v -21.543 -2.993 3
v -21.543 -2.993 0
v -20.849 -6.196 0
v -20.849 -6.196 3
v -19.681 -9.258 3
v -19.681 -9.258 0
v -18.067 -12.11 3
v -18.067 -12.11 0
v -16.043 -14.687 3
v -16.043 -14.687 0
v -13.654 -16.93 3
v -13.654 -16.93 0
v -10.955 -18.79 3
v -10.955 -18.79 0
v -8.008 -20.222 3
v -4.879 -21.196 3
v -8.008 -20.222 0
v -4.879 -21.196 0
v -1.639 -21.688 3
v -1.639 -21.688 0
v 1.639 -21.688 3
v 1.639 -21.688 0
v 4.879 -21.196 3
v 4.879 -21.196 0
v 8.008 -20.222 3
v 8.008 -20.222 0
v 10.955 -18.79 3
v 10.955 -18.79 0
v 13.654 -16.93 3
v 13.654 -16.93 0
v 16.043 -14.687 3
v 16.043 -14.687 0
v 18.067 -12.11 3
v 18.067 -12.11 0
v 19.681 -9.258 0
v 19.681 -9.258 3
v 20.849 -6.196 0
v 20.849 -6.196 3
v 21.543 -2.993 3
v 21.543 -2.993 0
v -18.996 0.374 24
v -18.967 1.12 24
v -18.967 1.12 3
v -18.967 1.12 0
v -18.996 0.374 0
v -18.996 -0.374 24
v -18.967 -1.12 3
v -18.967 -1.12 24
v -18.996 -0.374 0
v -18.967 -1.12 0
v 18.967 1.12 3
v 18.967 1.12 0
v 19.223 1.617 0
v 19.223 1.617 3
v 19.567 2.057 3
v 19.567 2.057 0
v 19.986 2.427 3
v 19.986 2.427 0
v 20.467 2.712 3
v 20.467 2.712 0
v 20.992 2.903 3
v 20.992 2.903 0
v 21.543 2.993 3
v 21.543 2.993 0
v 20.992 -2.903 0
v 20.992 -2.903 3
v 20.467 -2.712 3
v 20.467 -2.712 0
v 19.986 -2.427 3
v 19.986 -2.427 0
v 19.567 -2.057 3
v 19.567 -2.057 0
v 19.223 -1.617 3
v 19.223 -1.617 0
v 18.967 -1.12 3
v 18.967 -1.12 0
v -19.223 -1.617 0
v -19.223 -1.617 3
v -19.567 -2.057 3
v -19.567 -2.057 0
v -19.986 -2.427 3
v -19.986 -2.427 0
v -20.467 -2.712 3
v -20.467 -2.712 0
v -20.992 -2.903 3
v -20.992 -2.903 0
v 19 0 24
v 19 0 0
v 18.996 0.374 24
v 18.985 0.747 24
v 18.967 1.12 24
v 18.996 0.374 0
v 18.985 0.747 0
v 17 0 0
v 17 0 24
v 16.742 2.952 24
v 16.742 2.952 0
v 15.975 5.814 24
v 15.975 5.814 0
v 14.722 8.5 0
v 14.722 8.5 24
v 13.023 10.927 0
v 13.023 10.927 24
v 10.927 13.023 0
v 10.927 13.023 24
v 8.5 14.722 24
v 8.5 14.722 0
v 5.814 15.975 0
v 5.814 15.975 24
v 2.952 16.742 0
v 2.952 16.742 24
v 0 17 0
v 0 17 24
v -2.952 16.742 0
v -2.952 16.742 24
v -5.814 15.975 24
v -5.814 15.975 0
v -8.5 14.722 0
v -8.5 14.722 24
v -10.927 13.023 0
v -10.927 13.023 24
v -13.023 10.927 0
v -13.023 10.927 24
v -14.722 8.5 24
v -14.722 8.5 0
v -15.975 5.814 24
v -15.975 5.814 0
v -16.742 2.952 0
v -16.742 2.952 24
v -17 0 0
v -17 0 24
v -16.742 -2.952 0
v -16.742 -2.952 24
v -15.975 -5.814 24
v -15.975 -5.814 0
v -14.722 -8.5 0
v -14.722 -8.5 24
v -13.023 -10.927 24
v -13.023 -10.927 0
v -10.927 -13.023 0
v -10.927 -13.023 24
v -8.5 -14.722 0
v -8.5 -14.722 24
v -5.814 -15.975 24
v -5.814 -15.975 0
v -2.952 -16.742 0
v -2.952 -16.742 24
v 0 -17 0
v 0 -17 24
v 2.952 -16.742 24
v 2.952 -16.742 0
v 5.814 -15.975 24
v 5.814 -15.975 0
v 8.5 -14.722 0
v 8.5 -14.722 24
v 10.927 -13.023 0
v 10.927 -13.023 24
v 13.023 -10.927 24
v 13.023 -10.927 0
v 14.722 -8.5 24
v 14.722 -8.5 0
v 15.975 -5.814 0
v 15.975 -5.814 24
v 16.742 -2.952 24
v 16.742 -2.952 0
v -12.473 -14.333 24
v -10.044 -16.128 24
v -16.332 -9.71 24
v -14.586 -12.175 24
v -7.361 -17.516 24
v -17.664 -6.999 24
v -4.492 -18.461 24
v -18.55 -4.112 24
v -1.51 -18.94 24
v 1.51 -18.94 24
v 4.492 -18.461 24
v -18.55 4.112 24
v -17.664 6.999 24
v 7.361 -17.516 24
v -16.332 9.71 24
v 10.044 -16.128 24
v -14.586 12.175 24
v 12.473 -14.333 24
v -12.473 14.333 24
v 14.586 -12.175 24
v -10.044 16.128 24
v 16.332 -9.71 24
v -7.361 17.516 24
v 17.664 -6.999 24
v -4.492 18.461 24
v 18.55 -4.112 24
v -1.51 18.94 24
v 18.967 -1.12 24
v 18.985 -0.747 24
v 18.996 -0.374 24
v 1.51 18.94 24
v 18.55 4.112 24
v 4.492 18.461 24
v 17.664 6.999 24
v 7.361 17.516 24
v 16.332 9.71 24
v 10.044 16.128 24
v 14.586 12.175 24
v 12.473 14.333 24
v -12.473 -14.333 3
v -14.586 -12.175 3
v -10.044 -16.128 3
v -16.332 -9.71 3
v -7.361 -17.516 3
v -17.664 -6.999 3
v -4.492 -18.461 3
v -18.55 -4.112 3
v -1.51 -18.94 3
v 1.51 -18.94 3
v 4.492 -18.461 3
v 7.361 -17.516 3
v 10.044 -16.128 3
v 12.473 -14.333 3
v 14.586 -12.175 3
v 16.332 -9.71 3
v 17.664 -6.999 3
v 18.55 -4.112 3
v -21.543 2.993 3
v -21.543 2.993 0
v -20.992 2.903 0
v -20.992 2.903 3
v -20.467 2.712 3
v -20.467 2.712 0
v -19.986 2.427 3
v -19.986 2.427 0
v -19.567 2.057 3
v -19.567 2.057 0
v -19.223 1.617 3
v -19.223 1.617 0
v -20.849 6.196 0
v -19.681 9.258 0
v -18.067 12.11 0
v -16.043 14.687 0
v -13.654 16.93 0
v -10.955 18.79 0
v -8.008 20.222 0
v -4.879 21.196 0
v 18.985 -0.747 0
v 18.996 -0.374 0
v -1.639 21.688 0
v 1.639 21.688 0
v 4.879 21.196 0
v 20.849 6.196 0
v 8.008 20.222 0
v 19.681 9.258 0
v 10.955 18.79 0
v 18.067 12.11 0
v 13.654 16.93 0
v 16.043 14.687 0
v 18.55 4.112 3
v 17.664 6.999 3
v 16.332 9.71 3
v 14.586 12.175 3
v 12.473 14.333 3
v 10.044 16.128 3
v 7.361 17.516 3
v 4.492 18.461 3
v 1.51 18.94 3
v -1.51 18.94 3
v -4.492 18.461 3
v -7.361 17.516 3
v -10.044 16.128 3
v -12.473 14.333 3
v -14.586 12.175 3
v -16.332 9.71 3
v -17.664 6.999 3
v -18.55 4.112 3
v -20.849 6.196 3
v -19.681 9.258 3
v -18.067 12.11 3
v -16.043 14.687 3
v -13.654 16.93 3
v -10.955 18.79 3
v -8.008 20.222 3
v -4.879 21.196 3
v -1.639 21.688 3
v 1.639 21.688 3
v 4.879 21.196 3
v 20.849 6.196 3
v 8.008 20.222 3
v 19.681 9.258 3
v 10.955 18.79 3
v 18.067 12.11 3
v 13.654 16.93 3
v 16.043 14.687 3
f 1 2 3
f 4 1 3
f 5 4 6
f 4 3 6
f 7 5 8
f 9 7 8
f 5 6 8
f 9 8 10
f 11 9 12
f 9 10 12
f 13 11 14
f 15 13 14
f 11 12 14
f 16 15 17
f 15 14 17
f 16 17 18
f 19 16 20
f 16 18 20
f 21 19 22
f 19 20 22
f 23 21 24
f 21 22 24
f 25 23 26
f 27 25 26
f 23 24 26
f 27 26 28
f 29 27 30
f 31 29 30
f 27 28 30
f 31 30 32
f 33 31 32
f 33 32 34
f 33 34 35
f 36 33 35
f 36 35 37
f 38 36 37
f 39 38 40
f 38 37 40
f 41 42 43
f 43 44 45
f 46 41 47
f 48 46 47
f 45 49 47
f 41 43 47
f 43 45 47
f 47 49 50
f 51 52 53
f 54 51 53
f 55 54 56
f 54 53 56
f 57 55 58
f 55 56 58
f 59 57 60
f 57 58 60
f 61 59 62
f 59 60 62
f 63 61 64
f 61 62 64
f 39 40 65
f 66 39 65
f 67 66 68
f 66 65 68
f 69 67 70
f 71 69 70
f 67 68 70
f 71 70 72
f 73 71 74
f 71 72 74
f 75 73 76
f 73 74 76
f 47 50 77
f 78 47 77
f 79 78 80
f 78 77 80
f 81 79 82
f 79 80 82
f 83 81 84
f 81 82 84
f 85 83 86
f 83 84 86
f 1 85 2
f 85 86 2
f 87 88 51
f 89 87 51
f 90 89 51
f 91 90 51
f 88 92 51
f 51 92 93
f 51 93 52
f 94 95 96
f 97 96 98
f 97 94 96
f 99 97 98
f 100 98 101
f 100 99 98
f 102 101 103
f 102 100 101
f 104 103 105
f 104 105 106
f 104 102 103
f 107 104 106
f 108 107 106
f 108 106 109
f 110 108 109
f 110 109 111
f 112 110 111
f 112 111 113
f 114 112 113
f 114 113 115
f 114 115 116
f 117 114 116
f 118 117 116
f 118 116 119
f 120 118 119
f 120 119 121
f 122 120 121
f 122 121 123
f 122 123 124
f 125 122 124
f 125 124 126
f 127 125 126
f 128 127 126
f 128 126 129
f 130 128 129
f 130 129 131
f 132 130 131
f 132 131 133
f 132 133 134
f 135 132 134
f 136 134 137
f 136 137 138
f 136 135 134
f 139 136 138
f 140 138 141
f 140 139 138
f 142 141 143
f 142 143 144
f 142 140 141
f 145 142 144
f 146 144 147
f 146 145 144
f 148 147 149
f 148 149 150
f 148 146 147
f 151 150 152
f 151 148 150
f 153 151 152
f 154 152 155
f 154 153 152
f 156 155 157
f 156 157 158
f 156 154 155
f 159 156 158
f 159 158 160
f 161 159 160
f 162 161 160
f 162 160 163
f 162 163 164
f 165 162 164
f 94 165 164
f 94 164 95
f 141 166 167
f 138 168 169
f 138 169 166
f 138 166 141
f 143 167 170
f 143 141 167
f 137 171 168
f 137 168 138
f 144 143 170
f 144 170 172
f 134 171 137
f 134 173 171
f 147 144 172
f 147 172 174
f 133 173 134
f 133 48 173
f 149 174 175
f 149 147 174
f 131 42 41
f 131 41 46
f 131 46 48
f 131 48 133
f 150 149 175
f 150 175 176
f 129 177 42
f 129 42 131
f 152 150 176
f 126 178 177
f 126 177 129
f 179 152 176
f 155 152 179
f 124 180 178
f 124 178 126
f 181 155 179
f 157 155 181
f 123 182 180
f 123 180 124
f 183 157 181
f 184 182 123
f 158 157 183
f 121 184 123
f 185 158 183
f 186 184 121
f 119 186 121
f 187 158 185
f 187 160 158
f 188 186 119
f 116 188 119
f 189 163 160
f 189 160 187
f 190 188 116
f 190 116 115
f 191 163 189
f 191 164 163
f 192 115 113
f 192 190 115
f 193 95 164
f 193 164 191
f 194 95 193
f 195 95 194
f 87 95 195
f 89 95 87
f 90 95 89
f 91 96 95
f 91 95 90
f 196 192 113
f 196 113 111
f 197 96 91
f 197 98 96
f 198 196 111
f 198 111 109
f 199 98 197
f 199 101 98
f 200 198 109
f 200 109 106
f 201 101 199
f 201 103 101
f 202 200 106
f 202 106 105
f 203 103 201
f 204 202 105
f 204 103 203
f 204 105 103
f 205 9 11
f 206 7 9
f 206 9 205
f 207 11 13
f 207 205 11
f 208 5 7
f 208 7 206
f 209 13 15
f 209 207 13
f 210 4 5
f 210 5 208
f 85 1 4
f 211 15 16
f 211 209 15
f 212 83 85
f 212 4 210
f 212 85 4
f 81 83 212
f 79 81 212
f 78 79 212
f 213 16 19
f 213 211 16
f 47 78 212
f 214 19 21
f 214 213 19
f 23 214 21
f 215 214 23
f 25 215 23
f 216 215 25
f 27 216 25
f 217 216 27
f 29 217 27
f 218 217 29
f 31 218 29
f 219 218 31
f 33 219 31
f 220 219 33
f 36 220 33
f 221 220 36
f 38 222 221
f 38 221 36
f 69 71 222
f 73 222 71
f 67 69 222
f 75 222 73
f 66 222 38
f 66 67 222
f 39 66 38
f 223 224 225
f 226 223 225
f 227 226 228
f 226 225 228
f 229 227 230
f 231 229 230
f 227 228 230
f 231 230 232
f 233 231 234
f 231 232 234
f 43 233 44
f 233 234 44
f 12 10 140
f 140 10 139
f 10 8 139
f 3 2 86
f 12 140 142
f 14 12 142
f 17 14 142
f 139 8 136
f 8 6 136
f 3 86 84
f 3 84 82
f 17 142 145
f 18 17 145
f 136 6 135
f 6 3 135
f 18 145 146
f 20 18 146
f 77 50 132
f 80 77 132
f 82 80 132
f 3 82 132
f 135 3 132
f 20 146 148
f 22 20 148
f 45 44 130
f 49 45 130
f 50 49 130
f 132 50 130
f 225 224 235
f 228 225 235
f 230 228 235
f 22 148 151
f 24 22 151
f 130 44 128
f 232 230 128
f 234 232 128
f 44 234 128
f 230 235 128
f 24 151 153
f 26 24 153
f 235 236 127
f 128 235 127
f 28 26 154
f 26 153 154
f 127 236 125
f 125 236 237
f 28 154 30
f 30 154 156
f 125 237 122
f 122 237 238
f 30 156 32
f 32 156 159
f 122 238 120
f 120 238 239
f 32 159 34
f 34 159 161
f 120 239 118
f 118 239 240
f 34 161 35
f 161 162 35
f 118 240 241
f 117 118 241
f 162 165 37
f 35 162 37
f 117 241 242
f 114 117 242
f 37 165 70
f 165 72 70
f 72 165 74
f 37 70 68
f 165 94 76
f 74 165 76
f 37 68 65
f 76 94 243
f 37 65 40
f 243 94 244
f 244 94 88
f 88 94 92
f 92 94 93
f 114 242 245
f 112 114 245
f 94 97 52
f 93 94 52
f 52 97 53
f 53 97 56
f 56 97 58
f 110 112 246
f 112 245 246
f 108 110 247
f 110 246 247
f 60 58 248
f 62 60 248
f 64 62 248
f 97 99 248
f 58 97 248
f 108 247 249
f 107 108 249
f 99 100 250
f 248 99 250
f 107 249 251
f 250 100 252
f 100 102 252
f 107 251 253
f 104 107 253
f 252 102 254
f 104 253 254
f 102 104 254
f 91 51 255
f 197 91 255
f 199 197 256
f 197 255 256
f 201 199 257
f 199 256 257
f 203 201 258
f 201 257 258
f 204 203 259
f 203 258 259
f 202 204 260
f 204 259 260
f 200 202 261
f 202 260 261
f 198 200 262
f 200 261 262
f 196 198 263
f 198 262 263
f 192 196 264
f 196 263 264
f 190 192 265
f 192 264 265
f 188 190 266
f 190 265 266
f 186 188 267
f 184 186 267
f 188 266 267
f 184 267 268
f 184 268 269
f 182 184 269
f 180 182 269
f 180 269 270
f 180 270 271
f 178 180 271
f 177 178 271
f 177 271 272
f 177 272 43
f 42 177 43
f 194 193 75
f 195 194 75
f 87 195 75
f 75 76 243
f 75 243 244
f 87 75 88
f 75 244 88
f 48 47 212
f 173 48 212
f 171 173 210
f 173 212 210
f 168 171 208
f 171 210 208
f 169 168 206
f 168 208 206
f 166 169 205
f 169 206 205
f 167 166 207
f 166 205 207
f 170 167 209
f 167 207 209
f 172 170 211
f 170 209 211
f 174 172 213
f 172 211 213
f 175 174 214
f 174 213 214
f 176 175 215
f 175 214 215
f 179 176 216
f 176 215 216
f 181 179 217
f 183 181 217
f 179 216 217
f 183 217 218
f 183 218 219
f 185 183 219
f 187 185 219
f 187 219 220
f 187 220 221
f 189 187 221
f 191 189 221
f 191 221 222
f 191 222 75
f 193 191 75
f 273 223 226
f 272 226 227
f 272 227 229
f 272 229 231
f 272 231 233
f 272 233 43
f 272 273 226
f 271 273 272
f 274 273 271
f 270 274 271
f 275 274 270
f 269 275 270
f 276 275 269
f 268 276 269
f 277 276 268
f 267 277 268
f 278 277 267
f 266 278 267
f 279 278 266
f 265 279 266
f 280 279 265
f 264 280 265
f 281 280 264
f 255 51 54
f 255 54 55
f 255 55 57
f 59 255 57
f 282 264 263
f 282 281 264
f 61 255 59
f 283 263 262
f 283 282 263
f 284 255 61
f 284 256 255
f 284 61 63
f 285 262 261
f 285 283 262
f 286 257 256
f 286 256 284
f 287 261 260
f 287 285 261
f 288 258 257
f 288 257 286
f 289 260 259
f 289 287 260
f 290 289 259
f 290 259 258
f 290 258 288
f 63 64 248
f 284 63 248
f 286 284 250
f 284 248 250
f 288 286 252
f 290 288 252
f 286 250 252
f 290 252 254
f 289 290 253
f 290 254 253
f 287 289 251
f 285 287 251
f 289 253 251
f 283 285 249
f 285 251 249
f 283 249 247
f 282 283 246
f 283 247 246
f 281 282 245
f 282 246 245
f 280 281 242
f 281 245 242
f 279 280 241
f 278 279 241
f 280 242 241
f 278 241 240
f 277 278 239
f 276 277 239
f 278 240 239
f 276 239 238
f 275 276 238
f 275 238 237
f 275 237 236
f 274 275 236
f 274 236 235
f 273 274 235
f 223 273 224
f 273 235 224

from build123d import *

# Parameters (mm, degrees)
F0_R     = 17
F1_DEPTH = 3
F2_DEPTH = 24


with BuildPart() as f1:
    # F0 (on Top) → F1 (new body)
    with BuildSketch(Plane.XY):
        with BuildLine():
            ThreePointArc((18.966954023, 1.1201138736), (19.9859901049, 2.4265755892), (21.5431034483, 2.9928571327))
            ThreePointArc((21.5431034483, 2.9928571327), (0, 21.75), (-21.5431034483, 2.9928571327))
            ThreePointArc((-21.5431034483, 2.9928571327), (-19.9859901049, 2.4265755892), (-18.966954023, 1.1201138736))
            ThreePointArc((-18.966954023, 1.1201138736), (0, 19), (18.966954023, 1.1201138736))
        make_face()
        with BuildLine():
            ThreePointArc((-21.5431034483, -2.9928571327), (0, -21.75), (21.5431034483, -2.9928571327))
            ThreePointArc((21.5431034483, -2.9928571327), (19.9859901049, -2.4265755892), (18.966954023, -1.1201138736))
            ThreePointArc((18.966954023, -1.1201138736), (0, -19), (-18.966954023, -1.1201138736))
            ThreePointArc((-18.966954023, -1.1201138736), (-19.9859901049, -2.4265755892), (-21.5431034483, -2.9928571327))
        make_face()
        with BuildLine():
            ThreePointArc((18.966954023, -1.1201138736), (18.75, 0), (18.966954023, 1.1201138736))
            ThreePointArc((18.966954023, 1.1201138736), (0, 19), (-18.966954023, 1.1201138736))
            ThreePointArc((-18.966954023, 1.1201138736), (-18.8047378783, 0.5704656295), (-18.75, 0))
            ThreePointArc((-18.75, 0), (-18.8047378783, -0.5704656295), (-18.966954023, -1.1201138736))
            ThreePointArc((-18.966954023, -1.1201138736), (0, -19), (18.966954023, -1.1201138736))
        make_face()
        Circle(F0_R, mode=Mode.SUBTRACT)
    extrude(amount=F1_DEPTH)

    # F0 (on Top) → F2 (join)
    with BuildSketch(Plane.XY):
        with BuildLine():
            ThreePointArc((18.966954023, -1.1201138736), (18.75, 0), (18.966954023, 1.1201138736))
            ThreePointArc((18.966954023, 1.1201138736), (0, 19), (-18.966954023, 1.1201138736))
            ThreePointArc((-18.966954023, 1.1201138736), (-18.8047378783, 0.5704656295), (-18.75, 0))
            ThreePointArc((-18.75, 0), (-18.8047378783, -0.5704656295), (-18.966954023, -1.1201138736))
            ThreePointArc((-18.966954023, -1.1201138736), (0, -19), (18.966954023, -1.1201138736))
        make_face()
        Circle(F0_R, mode=Mode.SUBTRACT)
        with BuildLine():
            ThreePointArc((-18.75, 0), (-18.8047378783, 0.5704656295), (-18.966954023, 1.1201138736))
            ThreePointArc((-18.966954023, 1.1201138736), (-19, 0), (-18.966954023, -1.1201138736))
            ThreePointArc((-18.966954023, -1.1201138736), (-18.8047378783, -0.5704656295), (-18.75, 0))
        make_face()
        with BuildLine():
            ThreePointArc((19, 0), (18.9917367089, 0.5603006172), (18.966954023, 1.1201138736))
            ThreePointArc((18.966954023, 1.1201138736), (18.75, 0), (18.966954023, -1.1201138736))
            ThreePointArc((18.966954023, -1.1201138736), (18.9917367089, -0.5603006172), (19, 0))
        make_face()
    extrude(amount=F2_DEPTH)


solid = f1.part
